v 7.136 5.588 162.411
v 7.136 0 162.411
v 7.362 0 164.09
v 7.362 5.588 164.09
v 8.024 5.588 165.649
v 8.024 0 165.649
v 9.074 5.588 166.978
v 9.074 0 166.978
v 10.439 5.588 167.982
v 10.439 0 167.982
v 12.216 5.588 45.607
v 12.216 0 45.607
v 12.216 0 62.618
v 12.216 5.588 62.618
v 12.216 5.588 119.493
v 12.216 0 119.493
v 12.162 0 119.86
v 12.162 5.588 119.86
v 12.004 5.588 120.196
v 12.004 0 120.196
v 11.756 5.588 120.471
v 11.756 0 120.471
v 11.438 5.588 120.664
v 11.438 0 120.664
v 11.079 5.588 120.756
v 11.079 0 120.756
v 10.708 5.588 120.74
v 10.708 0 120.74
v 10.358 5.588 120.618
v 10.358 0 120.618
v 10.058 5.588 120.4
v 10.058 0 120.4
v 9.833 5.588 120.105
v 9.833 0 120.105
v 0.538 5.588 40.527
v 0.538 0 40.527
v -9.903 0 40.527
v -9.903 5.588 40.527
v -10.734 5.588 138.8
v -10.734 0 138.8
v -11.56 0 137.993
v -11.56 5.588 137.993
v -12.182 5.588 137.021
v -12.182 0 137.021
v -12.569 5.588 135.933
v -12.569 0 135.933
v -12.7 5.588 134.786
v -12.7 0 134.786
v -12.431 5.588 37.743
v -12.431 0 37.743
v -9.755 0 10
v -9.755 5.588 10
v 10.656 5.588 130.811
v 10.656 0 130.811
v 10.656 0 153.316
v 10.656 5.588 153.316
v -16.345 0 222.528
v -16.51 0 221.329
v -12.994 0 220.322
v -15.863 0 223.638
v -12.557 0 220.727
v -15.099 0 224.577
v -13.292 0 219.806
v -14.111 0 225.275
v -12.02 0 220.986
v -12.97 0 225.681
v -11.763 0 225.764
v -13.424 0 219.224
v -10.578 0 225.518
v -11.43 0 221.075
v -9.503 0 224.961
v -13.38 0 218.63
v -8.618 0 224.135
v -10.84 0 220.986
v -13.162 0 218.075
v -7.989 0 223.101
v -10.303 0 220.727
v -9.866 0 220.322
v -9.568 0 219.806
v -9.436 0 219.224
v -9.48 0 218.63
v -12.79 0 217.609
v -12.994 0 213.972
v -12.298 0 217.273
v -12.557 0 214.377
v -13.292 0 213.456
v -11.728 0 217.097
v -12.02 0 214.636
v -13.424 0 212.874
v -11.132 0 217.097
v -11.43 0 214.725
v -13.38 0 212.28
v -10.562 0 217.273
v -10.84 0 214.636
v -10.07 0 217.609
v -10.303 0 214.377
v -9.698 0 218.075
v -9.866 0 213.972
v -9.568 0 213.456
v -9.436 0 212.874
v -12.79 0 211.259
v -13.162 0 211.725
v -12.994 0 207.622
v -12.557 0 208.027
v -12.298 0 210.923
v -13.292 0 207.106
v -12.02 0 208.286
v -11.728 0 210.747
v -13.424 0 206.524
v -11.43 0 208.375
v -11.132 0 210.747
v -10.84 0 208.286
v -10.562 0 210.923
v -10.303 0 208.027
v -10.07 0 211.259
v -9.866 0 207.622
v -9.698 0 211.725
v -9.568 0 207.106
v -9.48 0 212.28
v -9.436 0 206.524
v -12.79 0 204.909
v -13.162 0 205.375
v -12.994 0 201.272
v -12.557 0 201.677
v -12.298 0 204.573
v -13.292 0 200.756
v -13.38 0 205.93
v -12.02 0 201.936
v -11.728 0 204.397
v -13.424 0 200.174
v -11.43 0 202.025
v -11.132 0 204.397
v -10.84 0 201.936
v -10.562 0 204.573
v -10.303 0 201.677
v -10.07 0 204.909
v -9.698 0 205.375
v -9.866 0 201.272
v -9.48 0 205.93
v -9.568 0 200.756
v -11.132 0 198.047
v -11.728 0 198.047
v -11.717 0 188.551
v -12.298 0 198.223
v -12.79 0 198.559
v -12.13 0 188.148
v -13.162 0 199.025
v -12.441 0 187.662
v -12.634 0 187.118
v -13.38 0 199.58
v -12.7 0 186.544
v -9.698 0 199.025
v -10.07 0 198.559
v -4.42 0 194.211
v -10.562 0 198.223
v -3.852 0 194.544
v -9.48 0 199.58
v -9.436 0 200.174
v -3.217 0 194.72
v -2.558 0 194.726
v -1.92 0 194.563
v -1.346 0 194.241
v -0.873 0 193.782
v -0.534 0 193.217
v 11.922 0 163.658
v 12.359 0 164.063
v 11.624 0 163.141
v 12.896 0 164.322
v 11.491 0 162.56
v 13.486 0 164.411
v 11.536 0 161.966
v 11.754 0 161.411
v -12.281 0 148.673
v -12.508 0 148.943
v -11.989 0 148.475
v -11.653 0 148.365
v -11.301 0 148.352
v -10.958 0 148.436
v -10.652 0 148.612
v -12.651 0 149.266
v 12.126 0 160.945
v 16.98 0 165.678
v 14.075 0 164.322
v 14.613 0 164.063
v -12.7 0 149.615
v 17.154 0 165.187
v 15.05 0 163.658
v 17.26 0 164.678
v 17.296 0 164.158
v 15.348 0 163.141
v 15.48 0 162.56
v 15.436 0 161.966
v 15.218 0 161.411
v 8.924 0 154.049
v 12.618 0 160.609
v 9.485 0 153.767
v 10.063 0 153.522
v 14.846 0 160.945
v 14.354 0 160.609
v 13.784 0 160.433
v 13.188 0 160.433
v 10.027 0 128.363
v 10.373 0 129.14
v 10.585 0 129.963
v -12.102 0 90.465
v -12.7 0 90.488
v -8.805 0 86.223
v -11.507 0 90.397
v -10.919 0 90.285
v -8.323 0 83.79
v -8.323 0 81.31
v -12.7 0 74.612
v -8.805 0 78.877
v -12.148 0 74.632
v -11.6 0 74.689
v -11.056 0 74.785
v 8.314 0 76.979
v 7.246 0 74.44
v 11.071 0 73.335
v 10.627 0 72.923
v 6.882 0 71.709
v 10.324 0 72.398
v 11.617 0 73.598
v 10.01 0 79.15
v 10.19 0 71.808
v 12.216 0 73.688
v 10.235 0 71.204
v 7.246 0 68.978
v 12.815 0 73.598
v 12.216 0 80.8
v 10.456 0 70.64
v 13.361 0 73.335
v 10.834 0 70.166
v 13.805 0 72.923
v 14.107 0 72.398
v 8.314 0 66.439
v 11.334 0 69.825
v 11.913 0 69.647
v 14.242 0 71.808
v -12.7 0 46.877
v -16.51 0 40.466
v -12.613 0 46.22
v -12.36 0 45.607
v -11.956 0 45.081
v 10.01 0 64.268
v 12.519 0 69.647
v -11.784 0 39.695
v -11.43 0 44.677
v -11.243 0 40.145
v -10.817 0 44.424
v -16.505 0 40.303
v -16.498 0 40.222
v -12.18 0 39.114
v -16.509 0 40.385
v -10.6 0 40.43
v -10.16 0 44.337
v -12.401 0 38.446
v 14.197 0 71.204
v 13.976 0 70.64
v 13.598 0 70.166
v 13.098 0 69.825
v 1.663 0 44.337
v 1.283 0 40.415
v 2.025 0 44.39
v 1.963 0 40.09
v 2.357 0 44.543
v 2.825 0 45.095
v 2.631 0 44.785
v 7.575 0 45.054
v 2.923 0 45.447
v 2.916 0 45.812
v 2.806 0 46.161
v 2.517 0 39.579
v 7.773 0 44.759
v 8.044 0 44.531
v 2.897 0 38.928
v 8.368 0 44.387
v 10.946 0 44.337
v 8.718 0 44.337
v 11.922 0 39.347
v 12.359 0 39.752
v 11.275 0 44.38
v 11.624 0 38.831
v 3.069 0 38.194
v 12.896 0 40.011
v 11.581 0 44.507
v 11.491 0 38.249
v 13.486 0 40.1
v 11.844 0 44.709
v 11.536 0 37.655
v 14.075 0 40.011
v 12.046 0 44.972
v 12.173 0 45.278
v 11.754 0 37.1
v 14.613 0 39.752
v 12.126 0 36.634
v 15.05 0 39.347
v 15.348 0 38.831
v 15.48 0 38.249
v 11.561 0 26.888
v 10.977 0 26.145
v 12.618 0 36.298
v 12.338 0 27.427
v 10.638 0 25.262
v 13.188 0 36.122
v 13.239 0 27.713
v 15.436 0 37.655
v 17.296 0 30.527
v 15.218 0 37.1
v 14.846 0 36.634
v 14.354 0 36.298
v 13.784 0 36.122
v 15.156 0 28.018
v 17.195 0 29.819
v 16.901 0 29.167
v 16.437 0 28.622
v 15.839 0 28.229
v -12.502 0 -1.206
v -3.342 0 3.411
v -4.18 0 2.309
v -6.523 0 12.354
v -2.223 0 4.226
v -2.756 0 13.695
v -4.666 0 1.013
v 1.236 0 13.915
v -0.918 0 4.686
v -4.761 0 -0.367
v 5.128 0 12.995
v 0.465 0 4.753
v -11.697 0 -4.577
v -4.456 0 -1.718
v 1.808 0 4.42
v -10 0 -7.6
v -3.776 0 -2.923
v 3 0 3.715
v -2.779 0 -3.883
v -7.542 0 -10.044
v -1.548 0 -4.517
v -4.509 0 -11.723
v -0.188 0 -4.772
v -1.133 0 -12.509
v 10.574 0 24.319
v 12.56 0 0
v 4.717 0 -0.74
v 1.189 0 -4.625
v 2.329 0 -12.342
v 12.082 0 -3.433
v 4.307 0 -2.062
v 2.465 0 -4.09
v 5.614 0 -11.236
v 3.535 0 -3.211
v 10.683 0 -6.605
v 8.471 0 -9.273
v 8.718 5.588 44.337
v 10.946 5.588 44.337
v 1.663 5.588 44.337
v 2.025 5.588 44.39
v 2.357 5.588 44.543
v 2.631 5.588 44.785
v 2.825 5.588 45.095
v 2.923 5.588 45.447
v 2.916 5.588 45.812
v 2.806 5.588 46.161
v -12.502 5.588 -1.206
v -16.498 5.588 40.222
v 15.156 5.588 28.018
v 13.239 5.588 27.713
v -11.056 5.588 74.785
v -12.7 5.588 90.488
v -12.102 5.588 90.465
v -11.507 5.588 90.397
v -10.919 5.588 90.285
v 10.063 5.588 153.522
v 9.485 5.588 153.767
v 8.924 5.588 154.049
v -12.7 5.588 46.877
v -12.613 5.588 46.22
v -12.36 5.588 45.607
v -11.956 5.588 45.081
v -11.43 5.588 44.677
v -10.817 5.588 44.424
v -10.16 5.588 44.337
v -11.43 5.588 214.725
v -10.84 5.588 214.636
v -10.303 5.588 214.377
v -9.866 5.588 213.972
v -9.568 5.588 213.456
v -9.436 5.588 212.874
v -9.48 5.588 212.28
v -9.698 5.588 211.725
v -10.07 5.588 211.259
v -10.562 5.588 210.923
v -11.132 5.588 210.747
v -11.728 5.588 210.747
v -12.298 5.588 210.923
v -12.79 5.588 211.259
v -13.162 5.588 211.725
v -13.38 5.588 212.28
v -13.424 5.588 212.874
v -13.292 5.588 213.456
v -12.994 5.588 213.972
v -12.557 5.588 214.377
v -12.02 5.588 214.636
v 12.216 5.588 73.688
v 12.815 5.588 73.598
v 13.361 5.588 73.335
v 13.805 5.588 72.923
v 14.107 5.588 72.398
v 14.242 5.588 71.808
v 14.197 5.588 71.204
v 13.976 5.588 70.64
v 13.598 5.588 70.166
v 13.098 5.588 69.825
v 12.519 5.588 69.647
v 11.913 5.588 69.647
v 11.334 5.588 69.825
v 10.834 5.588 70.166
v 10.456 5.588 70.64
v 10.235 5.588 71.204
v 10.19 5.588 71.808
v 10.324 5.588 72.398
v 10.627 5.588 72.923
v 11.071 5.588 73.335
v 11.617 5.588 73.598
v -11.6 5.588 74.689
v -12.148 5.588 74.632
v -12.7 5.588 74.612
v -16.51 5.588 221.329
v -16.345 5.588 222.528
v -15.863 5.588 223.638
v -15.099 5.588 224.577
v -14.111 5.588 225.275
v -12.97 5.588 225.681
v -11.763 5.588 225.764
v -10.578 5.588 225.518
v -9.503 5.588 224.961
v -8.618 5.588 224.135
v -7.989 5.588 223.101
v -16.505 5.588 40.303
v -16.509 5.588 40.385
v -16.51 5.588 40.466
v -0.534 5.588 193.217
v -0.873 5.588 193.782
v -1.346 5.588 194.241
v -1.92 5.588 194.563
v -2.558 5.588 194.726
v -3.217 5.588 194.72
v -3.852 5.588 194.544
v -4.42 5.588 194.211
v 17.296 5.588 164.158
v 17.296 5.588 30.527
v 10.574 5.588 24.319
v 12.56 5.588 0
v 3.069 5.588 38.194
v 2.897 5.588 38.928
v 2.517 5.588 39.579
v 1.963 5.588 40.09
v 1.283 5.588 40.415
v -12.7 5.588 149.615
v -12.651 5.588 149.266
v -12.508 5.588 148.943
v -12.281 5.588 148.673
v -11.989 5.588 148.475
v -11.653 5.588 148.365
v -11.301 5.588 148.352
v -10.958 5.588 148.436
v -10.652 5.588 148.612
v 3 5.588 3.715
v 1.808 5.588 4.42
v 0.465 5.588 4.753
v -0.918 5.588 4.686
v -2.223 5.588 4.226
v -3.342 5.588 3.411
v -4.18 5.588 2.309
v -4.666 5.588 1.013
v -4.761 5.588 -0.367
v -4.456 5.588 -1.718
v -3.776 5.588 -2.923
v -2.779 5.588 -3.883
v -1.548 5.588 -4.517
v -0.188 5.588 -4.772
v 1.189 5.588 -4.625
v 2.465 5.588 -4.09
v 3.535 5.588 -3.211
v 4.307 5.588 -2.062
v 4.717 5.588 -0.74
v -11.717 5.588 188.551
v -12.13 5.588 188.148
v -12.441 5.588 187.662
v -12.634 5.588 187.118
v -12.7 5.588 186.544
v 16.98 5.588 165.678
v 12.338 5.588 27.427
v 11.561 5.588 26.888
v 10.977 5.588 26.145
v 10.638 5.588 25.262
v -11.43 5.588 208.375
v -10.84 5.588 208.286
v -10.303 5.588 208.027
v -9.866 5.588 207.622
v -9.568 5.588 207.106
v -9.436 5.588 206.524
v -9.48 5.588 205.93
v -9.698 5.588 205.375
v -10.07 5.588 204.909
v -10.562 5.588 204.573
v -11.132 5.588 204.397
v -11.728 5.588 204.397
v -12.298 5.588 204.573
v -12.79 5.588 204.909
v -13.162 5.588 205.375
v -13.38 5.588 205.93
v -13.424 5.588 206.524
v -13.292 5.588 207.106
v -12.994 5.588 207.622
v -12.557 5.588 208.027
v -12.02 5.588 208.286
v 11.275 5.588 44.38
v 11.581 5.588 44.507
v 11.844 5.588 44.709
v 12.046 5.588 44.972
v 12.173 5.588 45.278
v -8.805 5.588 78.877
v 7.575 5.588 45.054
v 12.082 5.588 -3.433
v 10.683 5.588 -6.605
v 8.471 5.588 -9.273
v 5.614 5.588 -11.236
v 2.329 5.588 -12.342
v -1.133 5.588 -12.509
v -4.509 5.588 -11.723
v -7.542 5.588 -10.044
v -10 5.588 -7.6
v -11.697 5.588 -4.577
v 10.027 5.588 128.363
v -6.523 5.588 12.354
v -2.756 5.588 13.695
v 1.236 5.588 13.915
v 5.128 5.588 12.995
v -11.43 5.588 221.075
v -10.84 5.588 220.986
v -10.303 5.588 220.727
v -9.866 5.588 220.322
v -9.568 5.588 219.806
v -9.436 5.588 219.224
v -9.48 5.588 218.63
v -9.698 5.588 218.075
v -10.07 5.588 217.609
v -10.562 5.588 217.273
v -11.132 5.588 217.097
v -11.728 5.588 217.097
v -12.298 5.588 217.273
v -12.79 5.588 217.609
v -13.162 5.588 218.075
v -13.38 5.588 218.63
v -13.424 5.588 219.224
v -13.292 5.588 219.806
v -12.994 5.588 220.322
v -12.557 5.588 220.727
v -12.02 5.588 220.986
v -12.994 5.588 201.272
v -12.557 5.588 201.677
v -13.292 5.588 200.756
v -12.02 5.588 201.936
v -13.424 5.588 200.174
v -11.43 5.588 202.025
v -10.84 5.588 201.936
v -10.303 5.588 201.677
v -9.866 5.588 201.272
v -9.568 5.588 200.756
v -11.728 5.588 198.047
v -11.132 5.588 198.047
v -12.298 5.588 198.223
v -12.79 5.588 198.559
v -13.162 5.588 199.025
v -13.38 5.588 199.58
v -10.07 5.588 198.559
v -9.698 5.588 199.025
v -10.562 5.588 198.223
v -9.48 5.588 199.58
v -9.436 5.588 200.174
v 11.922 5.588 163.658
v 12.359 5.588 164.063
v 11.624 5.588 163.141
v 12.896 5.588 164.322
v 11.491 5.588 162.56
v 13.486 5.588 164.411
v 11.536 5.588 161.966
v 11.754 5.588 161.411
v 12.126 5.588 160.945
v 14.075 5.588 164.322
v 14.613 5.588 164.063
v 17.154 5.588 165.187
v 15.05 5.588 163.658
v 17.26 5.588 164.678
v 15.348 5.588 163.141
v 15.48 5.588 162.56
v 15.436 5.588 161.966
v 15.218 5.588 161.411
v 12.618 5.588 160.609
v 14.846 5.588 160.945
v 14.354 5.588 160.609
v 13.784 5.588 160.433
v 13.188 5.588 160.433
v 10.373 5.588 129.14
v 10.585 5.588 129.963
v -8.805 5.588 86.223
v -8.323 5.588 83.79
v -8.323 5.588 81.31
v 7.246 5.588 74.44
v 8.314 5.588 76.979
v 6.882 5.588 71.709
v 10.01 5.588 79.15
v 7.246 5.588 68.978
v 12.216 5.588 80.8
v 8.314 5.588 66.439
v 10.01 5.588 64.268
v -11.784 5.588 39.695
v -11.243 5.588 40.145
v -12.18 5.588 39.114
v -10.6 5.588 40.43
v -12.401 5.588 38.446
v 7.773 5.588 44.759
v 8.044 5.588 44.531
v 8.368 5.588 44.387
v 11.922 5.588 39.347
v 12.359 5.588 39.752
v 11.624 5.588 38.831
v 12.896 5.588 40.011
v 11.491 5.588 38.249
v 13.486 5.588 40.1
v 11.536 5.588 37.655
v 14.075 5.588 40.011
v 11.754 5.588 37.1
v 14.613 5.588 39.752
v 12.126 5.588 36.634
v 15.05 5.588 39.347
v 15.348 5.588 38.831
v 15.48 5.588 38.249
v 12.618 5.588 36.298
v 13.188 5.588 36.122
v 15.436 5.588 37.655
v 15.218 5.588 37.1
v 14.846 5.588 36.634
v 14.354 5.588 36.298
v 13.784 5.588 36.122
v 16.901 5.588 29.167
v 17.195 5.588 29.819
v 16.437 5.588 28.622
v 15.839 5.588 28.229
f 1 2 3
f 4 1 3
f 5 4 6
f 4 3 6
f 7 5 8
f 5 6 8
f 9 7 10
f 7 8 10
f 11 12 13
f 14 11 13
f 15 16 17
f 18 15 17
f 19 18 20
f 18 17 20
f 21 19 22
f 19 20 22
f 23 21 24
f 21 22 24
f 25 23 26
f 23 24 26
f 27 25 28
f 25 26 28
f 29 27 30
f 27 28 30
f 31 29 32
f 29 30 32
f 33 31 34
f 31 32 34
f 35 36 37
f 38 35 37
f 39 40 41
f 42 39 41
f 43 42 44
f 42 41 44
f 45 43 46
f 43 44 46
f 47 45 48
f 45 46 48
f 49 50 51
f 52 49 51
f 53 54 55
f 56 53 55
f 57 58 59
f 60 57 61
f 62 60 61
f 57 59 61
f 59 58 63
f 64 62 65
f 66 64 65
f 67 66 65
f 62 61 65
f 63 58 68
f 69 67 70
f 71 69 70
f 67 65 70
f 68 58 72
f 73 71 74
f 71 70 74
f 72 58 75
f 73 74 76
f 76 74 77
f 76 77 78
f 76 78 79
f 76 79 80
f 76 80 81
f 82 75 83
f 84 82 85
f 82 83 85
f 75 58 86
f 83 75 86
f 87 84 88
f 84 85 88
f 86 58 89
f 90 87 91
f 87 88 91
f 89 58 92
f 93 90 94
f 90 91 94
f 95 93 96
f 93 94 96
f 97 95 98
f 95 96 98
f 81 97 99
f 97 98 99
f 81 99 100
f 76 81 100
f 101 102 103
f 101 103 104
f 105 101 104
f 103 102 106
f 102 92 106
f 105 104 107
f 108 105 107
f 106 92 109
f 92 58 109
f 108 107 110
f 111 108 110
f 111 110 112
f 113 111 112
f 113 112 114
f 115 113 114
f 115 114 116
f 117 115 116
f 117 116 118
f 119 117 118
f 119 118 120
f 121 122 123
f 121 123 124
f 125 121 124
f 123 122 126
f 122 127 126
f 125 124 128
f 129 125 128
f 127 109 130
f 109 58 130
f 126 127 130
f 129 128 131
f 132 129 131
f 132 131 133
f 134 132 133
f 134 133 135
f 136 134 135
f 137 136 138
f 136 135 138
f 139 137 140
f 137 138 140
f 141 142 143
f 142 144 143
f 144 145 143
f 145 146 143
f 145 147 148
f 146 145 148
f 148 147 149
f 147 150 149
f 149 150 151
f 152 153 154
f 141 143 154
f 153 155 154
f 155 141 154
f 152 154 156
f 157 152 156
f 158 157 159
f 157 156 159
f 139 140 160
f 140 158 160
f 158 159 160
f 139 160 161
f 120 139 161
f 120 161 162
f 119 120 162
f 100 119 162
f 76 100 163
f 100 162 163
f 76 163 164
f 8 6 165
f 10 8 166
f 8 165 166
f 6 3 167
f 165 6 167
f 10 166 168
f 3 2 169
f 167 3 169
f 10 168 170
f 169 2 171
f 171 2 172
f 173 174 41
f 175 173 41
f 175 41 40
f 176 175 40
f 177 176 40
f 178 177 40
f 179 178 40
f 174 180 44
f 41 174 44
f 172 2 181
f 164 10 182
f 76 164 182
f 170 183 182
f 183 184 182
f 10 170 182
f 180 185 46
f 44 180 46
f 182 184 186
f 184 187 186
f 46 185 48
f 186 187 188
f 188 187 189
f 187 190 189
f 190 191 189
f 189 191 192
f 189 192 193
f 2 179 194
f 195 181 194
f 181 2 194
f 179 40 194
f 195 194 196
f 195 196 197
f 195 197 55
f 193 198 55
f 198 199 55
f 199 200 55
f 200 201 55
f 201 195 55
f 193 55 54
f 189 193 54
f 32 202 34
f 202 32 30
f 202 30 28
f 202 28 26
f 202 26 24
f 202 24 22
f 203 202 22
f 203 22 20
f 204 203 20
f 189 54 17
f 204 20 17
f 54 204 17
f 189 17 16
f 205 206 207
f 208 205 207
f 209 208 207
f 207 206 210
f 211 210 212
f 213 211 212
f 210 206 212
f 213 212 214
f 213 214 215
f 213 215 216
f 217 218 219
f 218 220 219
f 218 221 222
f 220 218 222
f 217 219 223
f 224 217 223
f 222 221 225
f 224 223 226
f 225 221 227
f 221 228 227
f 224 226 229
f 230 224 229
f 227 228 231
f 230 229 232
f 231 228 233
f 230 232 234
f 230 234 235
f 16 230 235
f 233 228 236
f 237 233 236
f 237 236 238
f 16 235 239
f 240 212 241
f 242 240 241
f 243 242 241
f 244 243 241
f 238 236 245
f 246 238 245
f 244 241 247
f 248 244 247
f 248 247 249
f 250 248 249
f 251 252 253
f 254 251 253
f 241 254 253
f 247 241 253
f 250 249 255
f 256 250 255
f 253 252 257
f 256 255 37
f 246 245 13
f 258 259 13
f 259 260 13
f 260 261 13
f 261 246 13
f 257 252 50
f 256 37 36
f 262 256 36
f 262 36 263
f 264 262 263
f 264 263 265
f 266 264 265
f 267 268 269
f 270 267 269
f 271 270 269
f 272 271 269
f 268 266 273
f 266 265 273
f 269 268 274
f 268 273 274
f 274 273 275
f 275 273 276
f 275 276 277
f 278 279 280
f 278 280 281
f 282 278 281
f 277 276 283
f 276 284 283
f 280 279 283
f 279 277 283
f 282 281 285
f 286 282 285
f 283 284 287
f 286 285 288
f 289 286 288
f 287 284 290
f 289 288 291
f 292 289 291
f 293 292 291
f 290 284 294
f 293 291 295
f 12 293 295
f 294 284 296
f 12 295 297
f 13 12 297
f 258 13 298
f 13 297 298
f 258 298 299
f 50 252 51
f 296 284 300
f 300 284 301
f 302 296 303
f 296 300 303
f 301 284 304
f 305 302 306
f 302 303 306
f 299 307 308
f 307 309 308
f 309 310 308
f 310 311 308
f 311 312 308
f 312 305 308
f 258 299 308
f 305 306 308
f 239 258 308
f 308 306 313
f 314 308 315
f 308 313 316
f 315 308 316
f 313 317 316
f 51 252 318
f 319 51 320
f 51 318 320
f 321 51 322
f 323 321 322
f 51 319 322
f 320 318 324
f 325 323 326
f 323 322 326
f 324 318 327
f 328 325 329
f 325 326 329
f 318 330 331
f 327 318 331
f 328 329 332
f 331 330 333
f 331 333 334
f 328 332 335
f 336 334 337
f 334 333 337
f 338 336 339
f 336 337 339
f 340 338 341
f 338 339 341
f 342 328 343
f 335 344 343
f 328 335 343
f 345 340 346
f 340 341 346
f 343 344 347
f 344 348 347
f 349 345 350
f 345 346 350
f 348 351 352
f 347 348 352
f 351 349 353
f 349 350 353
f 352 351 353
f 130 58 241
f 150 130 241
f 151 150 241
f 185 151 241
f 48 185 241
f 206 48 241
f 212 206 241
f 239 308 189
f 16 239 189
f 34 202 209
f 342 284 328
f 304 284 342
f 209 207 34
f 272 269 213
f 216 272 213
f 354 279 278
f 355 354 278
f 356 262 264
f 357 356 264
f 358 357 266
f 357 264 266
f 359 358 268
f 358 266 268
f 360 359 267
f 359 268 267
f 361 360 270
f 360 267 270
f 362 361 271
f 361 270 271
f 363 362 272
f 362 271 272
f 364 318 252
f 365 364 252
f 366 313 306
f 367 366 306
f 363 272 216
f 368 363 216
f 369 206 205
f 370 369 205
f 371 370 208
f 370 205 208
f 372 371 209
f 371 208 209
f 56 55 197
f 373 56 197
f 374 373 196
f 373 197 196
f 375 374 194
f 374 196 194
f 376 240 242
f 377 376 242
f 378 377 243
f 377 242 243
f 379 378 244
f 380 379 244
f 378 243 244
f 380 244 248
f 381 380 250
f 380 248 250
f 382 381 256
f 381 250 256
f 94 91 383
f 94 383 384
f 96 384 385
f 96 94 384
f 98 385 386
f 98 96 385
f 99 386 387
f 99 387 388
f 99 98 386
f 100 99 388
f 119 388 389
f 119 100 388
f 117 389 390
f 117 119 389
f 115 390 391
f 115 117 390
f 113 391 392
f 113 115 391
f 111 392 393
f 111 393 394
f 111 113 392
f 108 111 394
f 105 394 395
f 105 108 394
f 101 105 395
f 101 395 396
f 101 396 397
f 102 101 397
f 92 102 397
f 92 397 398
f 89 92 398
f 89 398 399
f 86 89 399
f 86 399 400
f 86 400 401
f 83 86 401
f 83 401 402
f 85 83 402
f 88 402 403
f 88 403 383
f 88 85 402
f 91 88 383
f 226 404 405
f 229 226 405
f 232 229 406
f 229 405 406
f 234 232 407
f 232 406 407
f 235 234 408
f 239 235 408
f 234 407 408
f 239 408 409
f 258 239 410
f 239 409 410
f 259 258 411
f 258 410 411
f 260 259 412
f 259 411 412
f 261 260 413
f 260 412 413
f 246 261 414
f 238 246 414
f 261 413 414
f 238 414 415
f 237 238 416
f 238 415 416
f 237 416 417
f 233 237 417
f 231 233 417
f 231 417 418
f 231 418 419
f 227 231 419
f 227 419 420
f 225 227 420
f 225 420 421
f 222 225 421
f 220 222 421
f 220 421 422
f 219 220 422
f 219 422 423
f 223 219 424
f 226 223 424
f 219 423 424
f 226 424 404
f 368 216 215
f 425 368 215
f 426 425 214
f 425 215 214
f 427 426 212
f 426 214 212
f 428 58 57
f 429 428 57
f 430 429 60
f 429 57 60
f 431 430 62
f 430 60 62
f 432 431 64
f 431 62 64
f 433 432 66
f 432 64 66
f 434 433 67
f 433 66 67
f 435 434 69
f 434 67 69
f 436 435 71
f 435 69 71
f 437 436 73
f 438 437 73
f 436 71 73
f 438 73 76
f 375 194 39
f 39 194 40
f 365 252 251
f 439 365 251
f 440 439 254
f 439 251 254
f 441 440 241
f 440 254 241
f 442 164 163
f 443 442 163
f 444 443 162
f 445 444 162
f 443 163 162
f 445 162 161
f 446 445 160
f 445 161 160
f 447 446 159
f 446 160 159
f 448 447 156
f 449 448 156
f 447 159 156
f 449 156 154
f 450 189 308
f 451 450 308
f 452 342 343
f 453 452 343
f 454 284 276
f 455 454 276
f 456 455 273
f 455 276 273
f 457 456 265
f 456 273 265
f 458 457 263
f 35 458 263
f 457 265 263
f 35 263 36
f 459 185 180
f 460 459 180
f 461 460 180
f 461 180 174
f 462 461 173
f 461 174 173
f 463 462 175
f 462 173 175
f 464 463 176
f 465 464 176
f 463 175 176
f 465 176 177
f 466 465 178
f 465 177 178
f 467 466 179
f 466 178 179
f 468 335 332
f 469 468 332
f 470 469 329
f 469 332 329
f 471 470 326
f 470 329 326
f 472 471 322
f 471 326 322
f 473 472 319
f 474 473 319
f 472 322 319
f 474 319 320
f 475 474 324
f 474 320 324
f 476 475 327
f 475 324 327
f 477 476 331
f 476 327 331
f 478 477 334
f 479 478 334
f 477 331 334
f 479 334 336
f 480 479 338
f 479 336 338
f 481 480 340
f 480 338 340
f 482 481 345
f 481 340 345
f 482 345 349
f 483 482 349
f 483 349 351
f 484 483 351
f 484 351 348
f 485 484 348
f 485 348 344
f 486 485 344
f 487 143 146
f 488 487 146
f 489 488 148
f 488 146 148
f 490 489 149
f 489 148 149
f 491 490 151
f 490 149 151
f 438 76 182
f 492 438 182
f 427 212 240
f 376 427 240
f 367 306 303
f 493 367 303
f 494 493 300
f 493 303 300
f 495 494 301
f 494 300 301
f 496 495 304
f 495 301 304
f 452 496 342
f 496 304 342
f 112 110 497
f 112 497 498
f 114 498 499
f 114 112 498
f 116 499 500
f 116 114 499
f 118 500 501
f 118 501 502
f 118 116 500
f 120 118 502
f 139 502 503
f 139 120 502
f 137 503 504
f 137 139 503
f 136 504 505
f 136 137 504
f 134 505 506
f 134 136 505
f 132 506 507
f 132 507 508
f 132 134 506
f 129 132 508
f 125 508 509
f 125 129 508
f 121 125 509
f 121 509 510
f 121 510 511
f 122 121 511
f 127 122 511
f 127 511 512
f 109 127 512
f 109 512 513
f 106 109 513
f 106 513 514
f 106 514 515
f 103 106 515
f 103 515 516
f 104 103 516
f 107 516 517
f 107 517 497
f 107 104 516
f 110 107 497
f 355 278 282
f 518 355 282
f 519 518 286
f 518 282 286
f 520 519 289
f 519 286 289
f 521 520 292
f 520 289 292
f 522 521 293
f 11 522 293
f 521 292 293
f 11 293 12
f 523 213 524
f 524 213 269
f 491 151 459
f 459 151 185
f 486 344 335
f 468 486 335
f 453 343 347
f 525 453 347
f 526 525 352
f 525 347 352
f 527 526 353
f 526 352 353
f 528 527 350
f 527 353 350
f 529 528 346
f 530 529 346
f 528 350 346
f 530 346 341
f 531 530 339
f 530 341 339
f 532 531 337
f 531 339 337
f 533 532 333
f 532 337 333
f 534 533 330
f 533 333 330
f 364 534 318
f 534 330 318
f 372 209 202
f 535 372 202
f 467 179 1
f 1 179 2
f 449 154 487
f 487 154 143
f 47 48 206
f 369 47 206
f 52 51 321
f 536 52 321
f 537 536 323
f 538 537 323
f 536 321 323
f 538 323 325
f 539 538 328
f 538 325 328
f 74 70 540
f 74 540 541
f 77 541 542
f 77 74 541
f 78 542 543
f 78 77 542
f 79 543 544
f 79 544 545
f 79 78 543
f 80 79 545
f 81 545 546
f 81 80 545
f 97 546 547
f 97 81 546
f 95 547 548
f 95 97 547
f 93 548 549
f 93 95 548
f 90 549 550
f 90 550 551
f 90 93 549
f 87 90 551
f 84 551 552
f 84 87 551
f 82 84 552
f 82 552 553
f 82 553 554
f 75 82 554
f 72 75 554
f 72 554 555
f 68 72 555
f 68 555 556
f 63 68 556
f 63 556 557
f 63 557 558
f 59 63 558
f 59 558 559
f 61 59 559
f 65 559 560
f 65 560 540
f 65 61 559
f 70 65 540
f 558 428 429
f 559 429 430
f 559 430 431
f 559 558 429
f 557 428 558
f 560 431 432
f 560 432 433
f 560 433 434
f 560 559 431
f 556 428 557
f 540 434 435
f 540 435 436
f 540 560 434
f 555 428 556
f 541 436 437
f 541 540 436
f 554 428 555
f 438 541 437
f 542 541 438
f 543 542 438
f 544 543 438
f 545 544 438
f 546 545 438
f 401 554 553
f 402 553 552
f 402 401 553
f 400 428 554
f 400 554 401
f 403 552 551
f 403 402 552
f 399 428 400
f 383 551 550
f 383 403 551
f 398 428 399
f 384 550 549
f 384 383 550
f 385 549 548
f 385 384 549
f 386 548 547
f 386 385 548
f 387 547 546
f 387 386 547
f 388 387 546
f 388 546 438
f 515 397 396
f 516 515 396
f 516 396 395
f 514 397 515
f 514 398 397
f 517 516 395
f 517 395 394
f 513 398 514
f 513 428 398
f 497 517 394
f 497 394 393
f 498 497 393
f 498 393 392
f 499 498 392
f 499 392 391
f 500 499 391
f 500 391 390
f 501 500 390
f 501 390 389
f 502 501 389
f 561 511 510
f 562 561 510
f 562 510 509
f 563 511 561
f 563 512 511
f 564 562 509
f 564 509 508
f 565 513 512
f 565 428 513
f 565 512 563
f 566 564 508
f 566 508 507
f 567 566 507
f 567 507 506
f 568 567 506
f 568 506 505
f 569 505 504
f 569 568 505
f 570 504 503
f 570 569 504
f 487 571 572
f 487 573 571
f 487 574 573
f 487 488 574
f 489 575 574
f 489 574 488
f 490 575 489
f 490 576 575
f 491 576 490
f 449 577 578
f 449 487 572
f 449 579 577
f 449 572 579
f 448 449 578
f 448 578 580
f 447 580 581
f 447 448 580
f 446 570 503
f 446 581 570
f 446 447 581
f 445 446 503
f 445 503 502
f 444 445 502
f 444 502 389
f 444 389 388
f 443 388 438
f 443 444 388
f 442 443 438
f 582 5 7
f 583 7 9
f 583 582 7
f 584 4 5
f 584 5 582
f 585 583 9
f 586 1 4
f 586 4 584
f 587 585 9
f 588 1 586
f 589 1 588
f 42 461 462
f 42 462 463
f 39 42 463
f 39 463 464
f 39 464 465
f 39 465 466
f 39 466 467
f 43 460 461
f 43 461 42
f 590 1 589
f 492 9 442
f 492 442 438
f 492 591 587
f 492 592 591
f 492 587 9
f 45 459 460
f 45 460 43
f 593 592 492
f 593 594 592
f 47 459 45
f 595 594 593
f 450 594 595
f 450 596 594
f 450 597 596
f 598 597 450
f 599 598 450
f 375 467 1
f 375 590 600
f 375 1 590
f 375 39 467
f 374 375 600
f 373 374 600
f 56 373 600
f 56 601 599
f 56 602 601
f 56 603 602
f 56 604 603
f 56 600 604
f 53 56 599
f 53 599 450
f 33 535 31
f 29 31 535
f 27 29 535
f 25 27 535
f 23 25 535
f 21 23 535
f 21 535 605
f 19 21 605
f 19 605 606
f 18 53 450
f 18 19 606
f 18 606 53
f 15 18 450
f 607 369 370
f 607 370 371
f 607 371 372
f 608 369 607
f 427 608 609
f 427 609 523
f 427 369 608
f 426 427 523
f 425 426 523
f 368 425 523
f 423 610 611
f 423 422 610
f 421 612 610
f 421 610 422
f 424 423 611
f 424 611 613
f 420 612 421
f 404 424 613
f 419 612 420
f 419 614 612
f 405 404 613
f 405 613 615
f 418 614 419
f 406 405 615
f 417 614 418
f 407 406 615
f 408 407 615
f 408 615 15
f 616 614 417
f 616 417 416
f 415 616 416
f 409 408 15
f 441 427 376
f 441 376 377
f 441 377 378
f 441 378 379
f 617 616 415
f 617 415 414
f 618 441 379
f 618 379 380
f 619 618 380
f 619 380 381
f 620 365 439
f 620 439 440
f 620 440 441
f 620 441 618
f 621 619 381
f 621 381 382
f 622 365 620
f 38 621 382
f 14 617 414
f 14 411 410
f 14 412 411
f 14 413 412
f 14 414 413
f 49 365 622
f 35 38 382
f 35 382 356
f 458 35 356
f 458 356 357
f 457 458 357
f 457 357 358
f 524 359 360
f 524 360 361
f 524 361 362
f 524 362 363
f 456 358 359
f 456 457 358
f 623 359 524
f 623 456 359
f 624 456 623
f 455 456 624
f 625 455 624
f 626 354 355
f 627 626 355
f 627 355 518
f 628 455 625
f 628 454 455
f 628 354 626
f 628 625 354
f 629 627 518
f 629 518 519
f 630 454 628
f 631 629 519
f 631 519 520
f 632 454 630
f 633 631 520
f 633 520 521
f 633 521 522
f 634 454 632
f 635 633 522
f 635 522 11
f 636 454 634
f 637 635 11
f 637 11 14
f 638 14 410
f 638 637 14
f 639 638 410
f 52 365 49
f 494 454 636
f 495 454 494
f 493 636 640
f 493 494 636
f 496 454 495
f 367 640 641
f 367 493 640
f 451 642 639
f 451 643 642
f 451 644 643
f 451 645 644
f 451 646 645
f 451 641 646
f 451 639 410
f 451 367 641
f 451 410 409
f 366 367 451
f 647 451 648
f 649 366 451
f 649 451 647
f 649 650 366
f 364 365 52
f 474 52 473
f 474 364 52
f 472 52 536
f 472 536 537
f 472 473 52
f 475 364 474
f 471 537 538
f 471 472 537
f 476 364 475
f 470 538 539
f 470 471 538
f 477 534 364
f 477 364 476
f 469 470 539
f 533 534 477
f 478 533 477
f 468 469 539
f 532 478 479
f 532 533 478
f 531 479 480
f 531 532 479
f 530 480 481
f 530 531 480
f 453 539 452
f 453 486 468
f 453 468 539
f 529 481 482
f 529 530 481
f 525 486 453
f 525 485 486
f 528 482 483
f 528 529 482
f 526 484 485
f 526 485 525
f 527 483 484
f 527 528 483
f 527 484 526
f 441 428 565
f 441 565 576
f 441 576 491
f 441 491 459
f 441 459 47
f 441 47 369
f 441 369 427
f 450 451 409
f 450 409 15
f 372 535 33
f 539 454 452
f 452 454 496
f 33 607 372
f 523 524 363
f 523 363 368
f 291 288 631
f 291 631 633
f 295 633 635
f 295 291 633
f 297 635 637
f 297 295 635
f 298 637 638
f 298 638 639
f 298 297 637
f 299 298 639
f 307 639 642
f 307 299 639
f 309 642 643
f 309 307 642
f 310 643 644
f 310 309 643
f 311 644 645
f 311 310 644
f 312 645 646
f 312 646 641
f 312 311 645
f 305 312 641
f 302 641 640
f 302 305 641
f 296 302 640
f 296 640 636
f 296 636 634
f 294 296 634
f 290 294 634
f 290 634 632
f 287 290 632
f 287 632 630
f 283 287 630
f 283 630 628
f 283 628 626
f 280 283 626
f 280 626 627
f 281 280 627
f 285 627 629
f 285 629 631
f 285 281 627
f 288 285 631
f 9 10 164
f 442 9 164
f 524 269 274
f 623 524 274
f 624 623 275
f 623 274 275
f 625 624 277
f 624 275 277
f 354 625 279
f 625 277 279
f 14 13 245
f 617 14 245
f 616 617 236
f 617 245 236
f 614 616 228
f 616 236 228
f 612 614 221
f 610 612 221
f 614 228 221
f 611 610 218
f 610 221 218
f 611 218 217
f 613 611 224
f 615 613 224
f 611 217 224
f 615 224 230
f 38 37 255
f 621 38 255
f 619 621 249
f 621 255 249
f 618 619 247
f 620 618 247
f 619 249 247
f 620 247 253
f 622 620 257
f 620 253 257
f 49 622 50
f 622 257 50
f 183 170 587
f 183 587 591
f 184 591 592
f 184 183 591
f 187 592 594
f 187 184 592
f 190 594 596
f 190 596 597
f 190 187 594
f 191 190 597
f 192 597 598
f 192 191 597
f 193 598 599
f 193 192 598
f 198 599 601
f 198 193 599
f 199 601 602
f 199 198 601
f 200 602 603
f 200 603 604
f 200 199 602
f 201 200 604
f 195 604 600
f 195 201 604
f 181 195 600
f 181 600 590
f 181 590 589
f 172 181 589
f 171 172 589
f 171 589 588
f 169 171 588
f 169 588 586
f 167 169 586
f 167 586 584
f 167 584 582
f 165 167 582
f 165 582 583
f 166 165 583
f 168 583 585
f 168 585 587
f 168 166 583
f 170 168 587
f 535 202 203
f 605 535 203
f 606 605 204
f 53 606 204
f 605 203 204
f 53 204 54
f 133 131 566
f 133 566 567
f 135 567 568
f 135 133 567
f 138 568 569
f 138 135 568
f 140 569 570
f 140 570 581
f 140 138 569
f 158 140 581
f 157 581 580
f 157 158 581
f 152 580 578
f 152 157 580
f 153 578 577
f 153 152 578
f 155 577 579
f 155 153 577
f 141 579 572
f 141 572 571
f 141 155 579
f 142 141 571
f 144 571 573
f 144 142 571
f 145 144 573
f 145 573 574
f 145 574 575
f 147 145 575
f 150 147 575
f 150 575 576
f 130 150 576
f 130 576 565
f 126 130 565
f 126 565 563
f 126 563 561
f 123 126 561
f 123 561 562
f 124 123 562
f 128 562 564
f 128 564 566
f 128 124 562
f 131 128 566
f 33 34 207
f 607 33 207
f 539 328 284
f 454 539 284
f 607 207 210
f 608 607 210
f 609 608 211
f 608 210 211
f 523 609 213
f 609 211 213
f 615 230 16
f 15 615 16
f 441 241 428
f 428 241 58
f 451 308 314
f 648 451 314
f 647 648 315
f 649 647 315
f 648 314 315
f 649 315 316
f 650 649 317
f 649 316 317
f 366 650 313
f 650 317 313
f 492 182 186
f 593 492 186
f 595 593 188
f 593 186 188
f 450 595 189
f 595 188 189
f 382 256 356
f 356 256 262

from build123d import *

# Parameters (mm, degrees)
SKETCH2_R           = 2
SKETCH2_R_2         = 1.999999991
BOSS_EXTRUDE1_DEPTH = 5.588
SKETCH7_R           = 2.032
CUT_EXTRUDE1_DEPTH  = 5.588


with BuildPart() as part:
    # Sketch2 → Boss-Extrude1 (new body)
    with BuildSketch(Plane(origin=(0, 0, 0), x_dir=(1, 0, 0), z_dir=(0, 1, 0))):
        with BuildLine():
            ThreePointArc((17.295902343, -30.526810701), (16.688093876, -28.878103365), (15.15555913, -28.018449791))
            Line((15.15555913, -28.018449791), (13.238676936, -27.713033224))
            ThreePointArc((13.238676936, -27.713033224), (11.241051513, -26.538356195), (10.573787778, -24.319092227))
            Line((10.573787778, -24.319092227), (12.5603, 0))
            ThreePointArc((12.5603, 0), (0.603657177, 12.545785512), (-12.502275592, 1.2059192))
            Line((-12.502275592, 1.2059192), (-16.498266045, -40.222207921))
            ThreePointArc((-16.498266045, -40.222207921), (-16.507064815, -40.344000039), (-16.51, -40.466074291))
            Line((-16.51, -40.466074291), (-16.51, -221.328861788))
            ThreePointArc((-16.51, -221.328861788), (-12.970187584, -225.680718913), (-7.988667969, -223.101301399))
            Line((-7.988667969, -223.101301399), (16.979901226, -165.677523619))
            ThreePointArc((16.979901226, -165.677523619), (17.216065593, -164.934164738), (17.295902343, -164.158289667))
            Line((17.295902343, -164.158289667), (17.295902343, -30.526810701))
        make_face()
        with Locations(Location((-11.43, -219.075, 0), (0, 0, 270))):
            Circle(SKETCH2_R, mode=Mode.SUBTRACT)
        with Locations(Location((-11.43, -212.725, 0), (0, 0, 270))):
            Circle(SKETCH2_R, mode=Mode.SUBTRACT)
        with Locations(Location((-11.43, -206.375, 0), (0, 0, 270))):
            Circle(SKETCH2_R, mode=Mode.SUBTRACT)
        with Locations(Location((-11.43, -200.025, 0), (0, 0, 270))):
            Circle(SKETCH2_R, mode=Mode.SUBTRACT)
        with BuildLine():
            ThreePointArc((7.135902343, -162.410770806), (8.023611961, -165.648962244), (10.438542905, -167.981776143))
            Line((10.438542905, -167.981776143), (-0.534170778, -193.217289931))
            ThreePointArc((-0.534170778, -193.217289931), (-2.234040931, -194.665234867), (-4.420389569, -194.211381682))
            Line((-4.420389569, -194.211381682), (-11.716886202, -188.551043102))
            ThreePointArc((-11.716886202, -188.551043102), (-12.441018517, -187.661516081), (-12.7, -186.544128716))
            Line((-12.7, -186.544128716), (-12.7, -149.615408258))
            ThreePointArc((-12.7, -149.615408258), (-11.988693683, -148.474898999), (-10.651556899, -148.611951065))
            Line((-10.651556899, -148.611951065), (7.135902343, -162.410770806))
        make_face(mode=Mode.SUBTRACT)
        with BuildLine():
            ThreePointArc((10.656105825, -153.315833936), (9.771695946, -153.639779081), (8.923603828, -154.049487576))
            Line((8.923603828, -154.049487576), (-10.733772403, -138.80005889))
            ThreePointArc((-10.733772403, -138.80005889), (-12.182037035, -137.021004847), (-12.7, -134.786230117))
            Line((-12.7, -134.786230117), (-12.7, -90.4875))
            ThreePointArc((-12.7, -90.4875), (-11.803536501, -90.43671411), (-10.918544548, -90.285006317))
            Line((-10.918544548, -90.285006317), (10.027134635, -128.362607876))
            ThreePointArc((10.027134635, -128.362607876), (10.49635106, -129.547067395), (10.656105825, -130.811024207))
            Line((10.656105825, -130.811024207), (10.656105825, -153.315833936))
        make_face(mode=Mode.SUBTRACT)
        with Locations(Location((13.485902343, -162.410770806, 0), (0, 0, 270))):
            Circle(SKETCH2_R, mode=Mode.SUBTRACT)
        with BuildLine():
            Line((-10.16, -44.337182032), (1.663048834, -44.337182032))
            ThreePointArc((1.663048834, -44.337182032), (2.739129831, -44.932682449), (2.806066447, -46.160725831))
            Line((2.806066447, -46.160725831), (-11.055993219, -74.784618621))
            ThreePointArc((-11.055993219, -74.784618621), (-11.873503915, -74.655646925), (-12.7, -74.6125))
            Line((-12.7, -74.6125), (-12.7, -46.877182032))
            ThreePointArc((-12.7, -46.877182032), (-11.956051224, -45.081130808), (-10.16, -44.337182032))
        make_face(mode=Mode.SUBTRACT)
        with BuildLine():
            ThreePointArc((-9.903213406, -40.527182032), (-11.783508673, -39.694838236), (-12.431479451, -37.743315662))
            Line((-12.431479451, -37.743315662), (-9.755434212, -9.99962016))
            ThreePointArc((-9.755434212, -9.99962016), (-2.756273581, -13.695395429), (5.127655889, -12.99492382))
            Line((5.127655889, -12.99492382), (3.069264048, -38.19397392))
            ThreePointArc((3.069264048, -38.19397392), (2.259083254, -39.854914801), (0.537695935, -40.527182032))
            Line((0.537695935, -40.527182032), (-9.903213406, -40.527182032))
        make_face(mode=Mode.SUBTRACT)
        with BuildLine():
            ThreePointArc((2.999946232, -3.71521973), (-4.455639512, 1.717501551), (4.717447783, 0.740419782))
            Line((4.717447783, 0.740419782), (2.999946232, -3.71521973))
        make_face(mode=Mode.SUBTRACT)
        with BuildLine():
            ThreePointArc((-8.804706991, -86.222769023), (-8.262040897, -82.55), (-8.804706991, -78.877230977))
            Line((-8.804706991, -78.877230977), (7.575478058, -45.053638233))
            ThreePointArc((7.575478058, -45.053638233), (8.043996088, -44.531101035), (8.718495671, -44.337182032))
            Line((8.718495671, -44.337182032), (10.945902343, -44.337182032))
            ThreePointArc((10.945902343, -44.337182032), (11.843927955, -44.70915642), (12.215902343, -45.607182032))
            Line((12.215902343, -45.607182032), (12.215902343, -62.618124667))
            ThreePointArc((12.215902343, -62.618124667), (6.881902343, -71.709053992), (12.215902343, -80.799983318))
            Line((12.215902343, -80.799983318), (12.215902343, -119.492817968))
            ThreePointArc((12.215902343, -119.492817968), (11.261891546, -120.722879277), (9.83314514, -120.104922051))
            Line((9.83314514, -120.104922051), (-8.804706991, -86.222769023))
        make_face(mode=Mode.SUBTRACT)
        with Locations(Location((13.485902343, -38.1, 0), (0, 0, 270))):
            Circle(SKETCH2_R_2, mode=Mode.SUBTRACT)
    extrude(amount=BOSS_EXTRUDE1_DEPTH)

    # Sketch7 → Cut-Extrude1 (cut)
    with BuildSketch(Plane(origin=(0, 5.588, 0), x_dir=(1, 0, 0), z_dir=(0, 1, 0))):
        with Locations(Location((12.215902343, -71.655983318, 0), (0, 0, 270))):
            Circle(SKETCH7_R)
    extrude(amount=-CUT_EXTRUDE1_DEPTH, mode=Mode.SUBTRACT)


solid = part.part
